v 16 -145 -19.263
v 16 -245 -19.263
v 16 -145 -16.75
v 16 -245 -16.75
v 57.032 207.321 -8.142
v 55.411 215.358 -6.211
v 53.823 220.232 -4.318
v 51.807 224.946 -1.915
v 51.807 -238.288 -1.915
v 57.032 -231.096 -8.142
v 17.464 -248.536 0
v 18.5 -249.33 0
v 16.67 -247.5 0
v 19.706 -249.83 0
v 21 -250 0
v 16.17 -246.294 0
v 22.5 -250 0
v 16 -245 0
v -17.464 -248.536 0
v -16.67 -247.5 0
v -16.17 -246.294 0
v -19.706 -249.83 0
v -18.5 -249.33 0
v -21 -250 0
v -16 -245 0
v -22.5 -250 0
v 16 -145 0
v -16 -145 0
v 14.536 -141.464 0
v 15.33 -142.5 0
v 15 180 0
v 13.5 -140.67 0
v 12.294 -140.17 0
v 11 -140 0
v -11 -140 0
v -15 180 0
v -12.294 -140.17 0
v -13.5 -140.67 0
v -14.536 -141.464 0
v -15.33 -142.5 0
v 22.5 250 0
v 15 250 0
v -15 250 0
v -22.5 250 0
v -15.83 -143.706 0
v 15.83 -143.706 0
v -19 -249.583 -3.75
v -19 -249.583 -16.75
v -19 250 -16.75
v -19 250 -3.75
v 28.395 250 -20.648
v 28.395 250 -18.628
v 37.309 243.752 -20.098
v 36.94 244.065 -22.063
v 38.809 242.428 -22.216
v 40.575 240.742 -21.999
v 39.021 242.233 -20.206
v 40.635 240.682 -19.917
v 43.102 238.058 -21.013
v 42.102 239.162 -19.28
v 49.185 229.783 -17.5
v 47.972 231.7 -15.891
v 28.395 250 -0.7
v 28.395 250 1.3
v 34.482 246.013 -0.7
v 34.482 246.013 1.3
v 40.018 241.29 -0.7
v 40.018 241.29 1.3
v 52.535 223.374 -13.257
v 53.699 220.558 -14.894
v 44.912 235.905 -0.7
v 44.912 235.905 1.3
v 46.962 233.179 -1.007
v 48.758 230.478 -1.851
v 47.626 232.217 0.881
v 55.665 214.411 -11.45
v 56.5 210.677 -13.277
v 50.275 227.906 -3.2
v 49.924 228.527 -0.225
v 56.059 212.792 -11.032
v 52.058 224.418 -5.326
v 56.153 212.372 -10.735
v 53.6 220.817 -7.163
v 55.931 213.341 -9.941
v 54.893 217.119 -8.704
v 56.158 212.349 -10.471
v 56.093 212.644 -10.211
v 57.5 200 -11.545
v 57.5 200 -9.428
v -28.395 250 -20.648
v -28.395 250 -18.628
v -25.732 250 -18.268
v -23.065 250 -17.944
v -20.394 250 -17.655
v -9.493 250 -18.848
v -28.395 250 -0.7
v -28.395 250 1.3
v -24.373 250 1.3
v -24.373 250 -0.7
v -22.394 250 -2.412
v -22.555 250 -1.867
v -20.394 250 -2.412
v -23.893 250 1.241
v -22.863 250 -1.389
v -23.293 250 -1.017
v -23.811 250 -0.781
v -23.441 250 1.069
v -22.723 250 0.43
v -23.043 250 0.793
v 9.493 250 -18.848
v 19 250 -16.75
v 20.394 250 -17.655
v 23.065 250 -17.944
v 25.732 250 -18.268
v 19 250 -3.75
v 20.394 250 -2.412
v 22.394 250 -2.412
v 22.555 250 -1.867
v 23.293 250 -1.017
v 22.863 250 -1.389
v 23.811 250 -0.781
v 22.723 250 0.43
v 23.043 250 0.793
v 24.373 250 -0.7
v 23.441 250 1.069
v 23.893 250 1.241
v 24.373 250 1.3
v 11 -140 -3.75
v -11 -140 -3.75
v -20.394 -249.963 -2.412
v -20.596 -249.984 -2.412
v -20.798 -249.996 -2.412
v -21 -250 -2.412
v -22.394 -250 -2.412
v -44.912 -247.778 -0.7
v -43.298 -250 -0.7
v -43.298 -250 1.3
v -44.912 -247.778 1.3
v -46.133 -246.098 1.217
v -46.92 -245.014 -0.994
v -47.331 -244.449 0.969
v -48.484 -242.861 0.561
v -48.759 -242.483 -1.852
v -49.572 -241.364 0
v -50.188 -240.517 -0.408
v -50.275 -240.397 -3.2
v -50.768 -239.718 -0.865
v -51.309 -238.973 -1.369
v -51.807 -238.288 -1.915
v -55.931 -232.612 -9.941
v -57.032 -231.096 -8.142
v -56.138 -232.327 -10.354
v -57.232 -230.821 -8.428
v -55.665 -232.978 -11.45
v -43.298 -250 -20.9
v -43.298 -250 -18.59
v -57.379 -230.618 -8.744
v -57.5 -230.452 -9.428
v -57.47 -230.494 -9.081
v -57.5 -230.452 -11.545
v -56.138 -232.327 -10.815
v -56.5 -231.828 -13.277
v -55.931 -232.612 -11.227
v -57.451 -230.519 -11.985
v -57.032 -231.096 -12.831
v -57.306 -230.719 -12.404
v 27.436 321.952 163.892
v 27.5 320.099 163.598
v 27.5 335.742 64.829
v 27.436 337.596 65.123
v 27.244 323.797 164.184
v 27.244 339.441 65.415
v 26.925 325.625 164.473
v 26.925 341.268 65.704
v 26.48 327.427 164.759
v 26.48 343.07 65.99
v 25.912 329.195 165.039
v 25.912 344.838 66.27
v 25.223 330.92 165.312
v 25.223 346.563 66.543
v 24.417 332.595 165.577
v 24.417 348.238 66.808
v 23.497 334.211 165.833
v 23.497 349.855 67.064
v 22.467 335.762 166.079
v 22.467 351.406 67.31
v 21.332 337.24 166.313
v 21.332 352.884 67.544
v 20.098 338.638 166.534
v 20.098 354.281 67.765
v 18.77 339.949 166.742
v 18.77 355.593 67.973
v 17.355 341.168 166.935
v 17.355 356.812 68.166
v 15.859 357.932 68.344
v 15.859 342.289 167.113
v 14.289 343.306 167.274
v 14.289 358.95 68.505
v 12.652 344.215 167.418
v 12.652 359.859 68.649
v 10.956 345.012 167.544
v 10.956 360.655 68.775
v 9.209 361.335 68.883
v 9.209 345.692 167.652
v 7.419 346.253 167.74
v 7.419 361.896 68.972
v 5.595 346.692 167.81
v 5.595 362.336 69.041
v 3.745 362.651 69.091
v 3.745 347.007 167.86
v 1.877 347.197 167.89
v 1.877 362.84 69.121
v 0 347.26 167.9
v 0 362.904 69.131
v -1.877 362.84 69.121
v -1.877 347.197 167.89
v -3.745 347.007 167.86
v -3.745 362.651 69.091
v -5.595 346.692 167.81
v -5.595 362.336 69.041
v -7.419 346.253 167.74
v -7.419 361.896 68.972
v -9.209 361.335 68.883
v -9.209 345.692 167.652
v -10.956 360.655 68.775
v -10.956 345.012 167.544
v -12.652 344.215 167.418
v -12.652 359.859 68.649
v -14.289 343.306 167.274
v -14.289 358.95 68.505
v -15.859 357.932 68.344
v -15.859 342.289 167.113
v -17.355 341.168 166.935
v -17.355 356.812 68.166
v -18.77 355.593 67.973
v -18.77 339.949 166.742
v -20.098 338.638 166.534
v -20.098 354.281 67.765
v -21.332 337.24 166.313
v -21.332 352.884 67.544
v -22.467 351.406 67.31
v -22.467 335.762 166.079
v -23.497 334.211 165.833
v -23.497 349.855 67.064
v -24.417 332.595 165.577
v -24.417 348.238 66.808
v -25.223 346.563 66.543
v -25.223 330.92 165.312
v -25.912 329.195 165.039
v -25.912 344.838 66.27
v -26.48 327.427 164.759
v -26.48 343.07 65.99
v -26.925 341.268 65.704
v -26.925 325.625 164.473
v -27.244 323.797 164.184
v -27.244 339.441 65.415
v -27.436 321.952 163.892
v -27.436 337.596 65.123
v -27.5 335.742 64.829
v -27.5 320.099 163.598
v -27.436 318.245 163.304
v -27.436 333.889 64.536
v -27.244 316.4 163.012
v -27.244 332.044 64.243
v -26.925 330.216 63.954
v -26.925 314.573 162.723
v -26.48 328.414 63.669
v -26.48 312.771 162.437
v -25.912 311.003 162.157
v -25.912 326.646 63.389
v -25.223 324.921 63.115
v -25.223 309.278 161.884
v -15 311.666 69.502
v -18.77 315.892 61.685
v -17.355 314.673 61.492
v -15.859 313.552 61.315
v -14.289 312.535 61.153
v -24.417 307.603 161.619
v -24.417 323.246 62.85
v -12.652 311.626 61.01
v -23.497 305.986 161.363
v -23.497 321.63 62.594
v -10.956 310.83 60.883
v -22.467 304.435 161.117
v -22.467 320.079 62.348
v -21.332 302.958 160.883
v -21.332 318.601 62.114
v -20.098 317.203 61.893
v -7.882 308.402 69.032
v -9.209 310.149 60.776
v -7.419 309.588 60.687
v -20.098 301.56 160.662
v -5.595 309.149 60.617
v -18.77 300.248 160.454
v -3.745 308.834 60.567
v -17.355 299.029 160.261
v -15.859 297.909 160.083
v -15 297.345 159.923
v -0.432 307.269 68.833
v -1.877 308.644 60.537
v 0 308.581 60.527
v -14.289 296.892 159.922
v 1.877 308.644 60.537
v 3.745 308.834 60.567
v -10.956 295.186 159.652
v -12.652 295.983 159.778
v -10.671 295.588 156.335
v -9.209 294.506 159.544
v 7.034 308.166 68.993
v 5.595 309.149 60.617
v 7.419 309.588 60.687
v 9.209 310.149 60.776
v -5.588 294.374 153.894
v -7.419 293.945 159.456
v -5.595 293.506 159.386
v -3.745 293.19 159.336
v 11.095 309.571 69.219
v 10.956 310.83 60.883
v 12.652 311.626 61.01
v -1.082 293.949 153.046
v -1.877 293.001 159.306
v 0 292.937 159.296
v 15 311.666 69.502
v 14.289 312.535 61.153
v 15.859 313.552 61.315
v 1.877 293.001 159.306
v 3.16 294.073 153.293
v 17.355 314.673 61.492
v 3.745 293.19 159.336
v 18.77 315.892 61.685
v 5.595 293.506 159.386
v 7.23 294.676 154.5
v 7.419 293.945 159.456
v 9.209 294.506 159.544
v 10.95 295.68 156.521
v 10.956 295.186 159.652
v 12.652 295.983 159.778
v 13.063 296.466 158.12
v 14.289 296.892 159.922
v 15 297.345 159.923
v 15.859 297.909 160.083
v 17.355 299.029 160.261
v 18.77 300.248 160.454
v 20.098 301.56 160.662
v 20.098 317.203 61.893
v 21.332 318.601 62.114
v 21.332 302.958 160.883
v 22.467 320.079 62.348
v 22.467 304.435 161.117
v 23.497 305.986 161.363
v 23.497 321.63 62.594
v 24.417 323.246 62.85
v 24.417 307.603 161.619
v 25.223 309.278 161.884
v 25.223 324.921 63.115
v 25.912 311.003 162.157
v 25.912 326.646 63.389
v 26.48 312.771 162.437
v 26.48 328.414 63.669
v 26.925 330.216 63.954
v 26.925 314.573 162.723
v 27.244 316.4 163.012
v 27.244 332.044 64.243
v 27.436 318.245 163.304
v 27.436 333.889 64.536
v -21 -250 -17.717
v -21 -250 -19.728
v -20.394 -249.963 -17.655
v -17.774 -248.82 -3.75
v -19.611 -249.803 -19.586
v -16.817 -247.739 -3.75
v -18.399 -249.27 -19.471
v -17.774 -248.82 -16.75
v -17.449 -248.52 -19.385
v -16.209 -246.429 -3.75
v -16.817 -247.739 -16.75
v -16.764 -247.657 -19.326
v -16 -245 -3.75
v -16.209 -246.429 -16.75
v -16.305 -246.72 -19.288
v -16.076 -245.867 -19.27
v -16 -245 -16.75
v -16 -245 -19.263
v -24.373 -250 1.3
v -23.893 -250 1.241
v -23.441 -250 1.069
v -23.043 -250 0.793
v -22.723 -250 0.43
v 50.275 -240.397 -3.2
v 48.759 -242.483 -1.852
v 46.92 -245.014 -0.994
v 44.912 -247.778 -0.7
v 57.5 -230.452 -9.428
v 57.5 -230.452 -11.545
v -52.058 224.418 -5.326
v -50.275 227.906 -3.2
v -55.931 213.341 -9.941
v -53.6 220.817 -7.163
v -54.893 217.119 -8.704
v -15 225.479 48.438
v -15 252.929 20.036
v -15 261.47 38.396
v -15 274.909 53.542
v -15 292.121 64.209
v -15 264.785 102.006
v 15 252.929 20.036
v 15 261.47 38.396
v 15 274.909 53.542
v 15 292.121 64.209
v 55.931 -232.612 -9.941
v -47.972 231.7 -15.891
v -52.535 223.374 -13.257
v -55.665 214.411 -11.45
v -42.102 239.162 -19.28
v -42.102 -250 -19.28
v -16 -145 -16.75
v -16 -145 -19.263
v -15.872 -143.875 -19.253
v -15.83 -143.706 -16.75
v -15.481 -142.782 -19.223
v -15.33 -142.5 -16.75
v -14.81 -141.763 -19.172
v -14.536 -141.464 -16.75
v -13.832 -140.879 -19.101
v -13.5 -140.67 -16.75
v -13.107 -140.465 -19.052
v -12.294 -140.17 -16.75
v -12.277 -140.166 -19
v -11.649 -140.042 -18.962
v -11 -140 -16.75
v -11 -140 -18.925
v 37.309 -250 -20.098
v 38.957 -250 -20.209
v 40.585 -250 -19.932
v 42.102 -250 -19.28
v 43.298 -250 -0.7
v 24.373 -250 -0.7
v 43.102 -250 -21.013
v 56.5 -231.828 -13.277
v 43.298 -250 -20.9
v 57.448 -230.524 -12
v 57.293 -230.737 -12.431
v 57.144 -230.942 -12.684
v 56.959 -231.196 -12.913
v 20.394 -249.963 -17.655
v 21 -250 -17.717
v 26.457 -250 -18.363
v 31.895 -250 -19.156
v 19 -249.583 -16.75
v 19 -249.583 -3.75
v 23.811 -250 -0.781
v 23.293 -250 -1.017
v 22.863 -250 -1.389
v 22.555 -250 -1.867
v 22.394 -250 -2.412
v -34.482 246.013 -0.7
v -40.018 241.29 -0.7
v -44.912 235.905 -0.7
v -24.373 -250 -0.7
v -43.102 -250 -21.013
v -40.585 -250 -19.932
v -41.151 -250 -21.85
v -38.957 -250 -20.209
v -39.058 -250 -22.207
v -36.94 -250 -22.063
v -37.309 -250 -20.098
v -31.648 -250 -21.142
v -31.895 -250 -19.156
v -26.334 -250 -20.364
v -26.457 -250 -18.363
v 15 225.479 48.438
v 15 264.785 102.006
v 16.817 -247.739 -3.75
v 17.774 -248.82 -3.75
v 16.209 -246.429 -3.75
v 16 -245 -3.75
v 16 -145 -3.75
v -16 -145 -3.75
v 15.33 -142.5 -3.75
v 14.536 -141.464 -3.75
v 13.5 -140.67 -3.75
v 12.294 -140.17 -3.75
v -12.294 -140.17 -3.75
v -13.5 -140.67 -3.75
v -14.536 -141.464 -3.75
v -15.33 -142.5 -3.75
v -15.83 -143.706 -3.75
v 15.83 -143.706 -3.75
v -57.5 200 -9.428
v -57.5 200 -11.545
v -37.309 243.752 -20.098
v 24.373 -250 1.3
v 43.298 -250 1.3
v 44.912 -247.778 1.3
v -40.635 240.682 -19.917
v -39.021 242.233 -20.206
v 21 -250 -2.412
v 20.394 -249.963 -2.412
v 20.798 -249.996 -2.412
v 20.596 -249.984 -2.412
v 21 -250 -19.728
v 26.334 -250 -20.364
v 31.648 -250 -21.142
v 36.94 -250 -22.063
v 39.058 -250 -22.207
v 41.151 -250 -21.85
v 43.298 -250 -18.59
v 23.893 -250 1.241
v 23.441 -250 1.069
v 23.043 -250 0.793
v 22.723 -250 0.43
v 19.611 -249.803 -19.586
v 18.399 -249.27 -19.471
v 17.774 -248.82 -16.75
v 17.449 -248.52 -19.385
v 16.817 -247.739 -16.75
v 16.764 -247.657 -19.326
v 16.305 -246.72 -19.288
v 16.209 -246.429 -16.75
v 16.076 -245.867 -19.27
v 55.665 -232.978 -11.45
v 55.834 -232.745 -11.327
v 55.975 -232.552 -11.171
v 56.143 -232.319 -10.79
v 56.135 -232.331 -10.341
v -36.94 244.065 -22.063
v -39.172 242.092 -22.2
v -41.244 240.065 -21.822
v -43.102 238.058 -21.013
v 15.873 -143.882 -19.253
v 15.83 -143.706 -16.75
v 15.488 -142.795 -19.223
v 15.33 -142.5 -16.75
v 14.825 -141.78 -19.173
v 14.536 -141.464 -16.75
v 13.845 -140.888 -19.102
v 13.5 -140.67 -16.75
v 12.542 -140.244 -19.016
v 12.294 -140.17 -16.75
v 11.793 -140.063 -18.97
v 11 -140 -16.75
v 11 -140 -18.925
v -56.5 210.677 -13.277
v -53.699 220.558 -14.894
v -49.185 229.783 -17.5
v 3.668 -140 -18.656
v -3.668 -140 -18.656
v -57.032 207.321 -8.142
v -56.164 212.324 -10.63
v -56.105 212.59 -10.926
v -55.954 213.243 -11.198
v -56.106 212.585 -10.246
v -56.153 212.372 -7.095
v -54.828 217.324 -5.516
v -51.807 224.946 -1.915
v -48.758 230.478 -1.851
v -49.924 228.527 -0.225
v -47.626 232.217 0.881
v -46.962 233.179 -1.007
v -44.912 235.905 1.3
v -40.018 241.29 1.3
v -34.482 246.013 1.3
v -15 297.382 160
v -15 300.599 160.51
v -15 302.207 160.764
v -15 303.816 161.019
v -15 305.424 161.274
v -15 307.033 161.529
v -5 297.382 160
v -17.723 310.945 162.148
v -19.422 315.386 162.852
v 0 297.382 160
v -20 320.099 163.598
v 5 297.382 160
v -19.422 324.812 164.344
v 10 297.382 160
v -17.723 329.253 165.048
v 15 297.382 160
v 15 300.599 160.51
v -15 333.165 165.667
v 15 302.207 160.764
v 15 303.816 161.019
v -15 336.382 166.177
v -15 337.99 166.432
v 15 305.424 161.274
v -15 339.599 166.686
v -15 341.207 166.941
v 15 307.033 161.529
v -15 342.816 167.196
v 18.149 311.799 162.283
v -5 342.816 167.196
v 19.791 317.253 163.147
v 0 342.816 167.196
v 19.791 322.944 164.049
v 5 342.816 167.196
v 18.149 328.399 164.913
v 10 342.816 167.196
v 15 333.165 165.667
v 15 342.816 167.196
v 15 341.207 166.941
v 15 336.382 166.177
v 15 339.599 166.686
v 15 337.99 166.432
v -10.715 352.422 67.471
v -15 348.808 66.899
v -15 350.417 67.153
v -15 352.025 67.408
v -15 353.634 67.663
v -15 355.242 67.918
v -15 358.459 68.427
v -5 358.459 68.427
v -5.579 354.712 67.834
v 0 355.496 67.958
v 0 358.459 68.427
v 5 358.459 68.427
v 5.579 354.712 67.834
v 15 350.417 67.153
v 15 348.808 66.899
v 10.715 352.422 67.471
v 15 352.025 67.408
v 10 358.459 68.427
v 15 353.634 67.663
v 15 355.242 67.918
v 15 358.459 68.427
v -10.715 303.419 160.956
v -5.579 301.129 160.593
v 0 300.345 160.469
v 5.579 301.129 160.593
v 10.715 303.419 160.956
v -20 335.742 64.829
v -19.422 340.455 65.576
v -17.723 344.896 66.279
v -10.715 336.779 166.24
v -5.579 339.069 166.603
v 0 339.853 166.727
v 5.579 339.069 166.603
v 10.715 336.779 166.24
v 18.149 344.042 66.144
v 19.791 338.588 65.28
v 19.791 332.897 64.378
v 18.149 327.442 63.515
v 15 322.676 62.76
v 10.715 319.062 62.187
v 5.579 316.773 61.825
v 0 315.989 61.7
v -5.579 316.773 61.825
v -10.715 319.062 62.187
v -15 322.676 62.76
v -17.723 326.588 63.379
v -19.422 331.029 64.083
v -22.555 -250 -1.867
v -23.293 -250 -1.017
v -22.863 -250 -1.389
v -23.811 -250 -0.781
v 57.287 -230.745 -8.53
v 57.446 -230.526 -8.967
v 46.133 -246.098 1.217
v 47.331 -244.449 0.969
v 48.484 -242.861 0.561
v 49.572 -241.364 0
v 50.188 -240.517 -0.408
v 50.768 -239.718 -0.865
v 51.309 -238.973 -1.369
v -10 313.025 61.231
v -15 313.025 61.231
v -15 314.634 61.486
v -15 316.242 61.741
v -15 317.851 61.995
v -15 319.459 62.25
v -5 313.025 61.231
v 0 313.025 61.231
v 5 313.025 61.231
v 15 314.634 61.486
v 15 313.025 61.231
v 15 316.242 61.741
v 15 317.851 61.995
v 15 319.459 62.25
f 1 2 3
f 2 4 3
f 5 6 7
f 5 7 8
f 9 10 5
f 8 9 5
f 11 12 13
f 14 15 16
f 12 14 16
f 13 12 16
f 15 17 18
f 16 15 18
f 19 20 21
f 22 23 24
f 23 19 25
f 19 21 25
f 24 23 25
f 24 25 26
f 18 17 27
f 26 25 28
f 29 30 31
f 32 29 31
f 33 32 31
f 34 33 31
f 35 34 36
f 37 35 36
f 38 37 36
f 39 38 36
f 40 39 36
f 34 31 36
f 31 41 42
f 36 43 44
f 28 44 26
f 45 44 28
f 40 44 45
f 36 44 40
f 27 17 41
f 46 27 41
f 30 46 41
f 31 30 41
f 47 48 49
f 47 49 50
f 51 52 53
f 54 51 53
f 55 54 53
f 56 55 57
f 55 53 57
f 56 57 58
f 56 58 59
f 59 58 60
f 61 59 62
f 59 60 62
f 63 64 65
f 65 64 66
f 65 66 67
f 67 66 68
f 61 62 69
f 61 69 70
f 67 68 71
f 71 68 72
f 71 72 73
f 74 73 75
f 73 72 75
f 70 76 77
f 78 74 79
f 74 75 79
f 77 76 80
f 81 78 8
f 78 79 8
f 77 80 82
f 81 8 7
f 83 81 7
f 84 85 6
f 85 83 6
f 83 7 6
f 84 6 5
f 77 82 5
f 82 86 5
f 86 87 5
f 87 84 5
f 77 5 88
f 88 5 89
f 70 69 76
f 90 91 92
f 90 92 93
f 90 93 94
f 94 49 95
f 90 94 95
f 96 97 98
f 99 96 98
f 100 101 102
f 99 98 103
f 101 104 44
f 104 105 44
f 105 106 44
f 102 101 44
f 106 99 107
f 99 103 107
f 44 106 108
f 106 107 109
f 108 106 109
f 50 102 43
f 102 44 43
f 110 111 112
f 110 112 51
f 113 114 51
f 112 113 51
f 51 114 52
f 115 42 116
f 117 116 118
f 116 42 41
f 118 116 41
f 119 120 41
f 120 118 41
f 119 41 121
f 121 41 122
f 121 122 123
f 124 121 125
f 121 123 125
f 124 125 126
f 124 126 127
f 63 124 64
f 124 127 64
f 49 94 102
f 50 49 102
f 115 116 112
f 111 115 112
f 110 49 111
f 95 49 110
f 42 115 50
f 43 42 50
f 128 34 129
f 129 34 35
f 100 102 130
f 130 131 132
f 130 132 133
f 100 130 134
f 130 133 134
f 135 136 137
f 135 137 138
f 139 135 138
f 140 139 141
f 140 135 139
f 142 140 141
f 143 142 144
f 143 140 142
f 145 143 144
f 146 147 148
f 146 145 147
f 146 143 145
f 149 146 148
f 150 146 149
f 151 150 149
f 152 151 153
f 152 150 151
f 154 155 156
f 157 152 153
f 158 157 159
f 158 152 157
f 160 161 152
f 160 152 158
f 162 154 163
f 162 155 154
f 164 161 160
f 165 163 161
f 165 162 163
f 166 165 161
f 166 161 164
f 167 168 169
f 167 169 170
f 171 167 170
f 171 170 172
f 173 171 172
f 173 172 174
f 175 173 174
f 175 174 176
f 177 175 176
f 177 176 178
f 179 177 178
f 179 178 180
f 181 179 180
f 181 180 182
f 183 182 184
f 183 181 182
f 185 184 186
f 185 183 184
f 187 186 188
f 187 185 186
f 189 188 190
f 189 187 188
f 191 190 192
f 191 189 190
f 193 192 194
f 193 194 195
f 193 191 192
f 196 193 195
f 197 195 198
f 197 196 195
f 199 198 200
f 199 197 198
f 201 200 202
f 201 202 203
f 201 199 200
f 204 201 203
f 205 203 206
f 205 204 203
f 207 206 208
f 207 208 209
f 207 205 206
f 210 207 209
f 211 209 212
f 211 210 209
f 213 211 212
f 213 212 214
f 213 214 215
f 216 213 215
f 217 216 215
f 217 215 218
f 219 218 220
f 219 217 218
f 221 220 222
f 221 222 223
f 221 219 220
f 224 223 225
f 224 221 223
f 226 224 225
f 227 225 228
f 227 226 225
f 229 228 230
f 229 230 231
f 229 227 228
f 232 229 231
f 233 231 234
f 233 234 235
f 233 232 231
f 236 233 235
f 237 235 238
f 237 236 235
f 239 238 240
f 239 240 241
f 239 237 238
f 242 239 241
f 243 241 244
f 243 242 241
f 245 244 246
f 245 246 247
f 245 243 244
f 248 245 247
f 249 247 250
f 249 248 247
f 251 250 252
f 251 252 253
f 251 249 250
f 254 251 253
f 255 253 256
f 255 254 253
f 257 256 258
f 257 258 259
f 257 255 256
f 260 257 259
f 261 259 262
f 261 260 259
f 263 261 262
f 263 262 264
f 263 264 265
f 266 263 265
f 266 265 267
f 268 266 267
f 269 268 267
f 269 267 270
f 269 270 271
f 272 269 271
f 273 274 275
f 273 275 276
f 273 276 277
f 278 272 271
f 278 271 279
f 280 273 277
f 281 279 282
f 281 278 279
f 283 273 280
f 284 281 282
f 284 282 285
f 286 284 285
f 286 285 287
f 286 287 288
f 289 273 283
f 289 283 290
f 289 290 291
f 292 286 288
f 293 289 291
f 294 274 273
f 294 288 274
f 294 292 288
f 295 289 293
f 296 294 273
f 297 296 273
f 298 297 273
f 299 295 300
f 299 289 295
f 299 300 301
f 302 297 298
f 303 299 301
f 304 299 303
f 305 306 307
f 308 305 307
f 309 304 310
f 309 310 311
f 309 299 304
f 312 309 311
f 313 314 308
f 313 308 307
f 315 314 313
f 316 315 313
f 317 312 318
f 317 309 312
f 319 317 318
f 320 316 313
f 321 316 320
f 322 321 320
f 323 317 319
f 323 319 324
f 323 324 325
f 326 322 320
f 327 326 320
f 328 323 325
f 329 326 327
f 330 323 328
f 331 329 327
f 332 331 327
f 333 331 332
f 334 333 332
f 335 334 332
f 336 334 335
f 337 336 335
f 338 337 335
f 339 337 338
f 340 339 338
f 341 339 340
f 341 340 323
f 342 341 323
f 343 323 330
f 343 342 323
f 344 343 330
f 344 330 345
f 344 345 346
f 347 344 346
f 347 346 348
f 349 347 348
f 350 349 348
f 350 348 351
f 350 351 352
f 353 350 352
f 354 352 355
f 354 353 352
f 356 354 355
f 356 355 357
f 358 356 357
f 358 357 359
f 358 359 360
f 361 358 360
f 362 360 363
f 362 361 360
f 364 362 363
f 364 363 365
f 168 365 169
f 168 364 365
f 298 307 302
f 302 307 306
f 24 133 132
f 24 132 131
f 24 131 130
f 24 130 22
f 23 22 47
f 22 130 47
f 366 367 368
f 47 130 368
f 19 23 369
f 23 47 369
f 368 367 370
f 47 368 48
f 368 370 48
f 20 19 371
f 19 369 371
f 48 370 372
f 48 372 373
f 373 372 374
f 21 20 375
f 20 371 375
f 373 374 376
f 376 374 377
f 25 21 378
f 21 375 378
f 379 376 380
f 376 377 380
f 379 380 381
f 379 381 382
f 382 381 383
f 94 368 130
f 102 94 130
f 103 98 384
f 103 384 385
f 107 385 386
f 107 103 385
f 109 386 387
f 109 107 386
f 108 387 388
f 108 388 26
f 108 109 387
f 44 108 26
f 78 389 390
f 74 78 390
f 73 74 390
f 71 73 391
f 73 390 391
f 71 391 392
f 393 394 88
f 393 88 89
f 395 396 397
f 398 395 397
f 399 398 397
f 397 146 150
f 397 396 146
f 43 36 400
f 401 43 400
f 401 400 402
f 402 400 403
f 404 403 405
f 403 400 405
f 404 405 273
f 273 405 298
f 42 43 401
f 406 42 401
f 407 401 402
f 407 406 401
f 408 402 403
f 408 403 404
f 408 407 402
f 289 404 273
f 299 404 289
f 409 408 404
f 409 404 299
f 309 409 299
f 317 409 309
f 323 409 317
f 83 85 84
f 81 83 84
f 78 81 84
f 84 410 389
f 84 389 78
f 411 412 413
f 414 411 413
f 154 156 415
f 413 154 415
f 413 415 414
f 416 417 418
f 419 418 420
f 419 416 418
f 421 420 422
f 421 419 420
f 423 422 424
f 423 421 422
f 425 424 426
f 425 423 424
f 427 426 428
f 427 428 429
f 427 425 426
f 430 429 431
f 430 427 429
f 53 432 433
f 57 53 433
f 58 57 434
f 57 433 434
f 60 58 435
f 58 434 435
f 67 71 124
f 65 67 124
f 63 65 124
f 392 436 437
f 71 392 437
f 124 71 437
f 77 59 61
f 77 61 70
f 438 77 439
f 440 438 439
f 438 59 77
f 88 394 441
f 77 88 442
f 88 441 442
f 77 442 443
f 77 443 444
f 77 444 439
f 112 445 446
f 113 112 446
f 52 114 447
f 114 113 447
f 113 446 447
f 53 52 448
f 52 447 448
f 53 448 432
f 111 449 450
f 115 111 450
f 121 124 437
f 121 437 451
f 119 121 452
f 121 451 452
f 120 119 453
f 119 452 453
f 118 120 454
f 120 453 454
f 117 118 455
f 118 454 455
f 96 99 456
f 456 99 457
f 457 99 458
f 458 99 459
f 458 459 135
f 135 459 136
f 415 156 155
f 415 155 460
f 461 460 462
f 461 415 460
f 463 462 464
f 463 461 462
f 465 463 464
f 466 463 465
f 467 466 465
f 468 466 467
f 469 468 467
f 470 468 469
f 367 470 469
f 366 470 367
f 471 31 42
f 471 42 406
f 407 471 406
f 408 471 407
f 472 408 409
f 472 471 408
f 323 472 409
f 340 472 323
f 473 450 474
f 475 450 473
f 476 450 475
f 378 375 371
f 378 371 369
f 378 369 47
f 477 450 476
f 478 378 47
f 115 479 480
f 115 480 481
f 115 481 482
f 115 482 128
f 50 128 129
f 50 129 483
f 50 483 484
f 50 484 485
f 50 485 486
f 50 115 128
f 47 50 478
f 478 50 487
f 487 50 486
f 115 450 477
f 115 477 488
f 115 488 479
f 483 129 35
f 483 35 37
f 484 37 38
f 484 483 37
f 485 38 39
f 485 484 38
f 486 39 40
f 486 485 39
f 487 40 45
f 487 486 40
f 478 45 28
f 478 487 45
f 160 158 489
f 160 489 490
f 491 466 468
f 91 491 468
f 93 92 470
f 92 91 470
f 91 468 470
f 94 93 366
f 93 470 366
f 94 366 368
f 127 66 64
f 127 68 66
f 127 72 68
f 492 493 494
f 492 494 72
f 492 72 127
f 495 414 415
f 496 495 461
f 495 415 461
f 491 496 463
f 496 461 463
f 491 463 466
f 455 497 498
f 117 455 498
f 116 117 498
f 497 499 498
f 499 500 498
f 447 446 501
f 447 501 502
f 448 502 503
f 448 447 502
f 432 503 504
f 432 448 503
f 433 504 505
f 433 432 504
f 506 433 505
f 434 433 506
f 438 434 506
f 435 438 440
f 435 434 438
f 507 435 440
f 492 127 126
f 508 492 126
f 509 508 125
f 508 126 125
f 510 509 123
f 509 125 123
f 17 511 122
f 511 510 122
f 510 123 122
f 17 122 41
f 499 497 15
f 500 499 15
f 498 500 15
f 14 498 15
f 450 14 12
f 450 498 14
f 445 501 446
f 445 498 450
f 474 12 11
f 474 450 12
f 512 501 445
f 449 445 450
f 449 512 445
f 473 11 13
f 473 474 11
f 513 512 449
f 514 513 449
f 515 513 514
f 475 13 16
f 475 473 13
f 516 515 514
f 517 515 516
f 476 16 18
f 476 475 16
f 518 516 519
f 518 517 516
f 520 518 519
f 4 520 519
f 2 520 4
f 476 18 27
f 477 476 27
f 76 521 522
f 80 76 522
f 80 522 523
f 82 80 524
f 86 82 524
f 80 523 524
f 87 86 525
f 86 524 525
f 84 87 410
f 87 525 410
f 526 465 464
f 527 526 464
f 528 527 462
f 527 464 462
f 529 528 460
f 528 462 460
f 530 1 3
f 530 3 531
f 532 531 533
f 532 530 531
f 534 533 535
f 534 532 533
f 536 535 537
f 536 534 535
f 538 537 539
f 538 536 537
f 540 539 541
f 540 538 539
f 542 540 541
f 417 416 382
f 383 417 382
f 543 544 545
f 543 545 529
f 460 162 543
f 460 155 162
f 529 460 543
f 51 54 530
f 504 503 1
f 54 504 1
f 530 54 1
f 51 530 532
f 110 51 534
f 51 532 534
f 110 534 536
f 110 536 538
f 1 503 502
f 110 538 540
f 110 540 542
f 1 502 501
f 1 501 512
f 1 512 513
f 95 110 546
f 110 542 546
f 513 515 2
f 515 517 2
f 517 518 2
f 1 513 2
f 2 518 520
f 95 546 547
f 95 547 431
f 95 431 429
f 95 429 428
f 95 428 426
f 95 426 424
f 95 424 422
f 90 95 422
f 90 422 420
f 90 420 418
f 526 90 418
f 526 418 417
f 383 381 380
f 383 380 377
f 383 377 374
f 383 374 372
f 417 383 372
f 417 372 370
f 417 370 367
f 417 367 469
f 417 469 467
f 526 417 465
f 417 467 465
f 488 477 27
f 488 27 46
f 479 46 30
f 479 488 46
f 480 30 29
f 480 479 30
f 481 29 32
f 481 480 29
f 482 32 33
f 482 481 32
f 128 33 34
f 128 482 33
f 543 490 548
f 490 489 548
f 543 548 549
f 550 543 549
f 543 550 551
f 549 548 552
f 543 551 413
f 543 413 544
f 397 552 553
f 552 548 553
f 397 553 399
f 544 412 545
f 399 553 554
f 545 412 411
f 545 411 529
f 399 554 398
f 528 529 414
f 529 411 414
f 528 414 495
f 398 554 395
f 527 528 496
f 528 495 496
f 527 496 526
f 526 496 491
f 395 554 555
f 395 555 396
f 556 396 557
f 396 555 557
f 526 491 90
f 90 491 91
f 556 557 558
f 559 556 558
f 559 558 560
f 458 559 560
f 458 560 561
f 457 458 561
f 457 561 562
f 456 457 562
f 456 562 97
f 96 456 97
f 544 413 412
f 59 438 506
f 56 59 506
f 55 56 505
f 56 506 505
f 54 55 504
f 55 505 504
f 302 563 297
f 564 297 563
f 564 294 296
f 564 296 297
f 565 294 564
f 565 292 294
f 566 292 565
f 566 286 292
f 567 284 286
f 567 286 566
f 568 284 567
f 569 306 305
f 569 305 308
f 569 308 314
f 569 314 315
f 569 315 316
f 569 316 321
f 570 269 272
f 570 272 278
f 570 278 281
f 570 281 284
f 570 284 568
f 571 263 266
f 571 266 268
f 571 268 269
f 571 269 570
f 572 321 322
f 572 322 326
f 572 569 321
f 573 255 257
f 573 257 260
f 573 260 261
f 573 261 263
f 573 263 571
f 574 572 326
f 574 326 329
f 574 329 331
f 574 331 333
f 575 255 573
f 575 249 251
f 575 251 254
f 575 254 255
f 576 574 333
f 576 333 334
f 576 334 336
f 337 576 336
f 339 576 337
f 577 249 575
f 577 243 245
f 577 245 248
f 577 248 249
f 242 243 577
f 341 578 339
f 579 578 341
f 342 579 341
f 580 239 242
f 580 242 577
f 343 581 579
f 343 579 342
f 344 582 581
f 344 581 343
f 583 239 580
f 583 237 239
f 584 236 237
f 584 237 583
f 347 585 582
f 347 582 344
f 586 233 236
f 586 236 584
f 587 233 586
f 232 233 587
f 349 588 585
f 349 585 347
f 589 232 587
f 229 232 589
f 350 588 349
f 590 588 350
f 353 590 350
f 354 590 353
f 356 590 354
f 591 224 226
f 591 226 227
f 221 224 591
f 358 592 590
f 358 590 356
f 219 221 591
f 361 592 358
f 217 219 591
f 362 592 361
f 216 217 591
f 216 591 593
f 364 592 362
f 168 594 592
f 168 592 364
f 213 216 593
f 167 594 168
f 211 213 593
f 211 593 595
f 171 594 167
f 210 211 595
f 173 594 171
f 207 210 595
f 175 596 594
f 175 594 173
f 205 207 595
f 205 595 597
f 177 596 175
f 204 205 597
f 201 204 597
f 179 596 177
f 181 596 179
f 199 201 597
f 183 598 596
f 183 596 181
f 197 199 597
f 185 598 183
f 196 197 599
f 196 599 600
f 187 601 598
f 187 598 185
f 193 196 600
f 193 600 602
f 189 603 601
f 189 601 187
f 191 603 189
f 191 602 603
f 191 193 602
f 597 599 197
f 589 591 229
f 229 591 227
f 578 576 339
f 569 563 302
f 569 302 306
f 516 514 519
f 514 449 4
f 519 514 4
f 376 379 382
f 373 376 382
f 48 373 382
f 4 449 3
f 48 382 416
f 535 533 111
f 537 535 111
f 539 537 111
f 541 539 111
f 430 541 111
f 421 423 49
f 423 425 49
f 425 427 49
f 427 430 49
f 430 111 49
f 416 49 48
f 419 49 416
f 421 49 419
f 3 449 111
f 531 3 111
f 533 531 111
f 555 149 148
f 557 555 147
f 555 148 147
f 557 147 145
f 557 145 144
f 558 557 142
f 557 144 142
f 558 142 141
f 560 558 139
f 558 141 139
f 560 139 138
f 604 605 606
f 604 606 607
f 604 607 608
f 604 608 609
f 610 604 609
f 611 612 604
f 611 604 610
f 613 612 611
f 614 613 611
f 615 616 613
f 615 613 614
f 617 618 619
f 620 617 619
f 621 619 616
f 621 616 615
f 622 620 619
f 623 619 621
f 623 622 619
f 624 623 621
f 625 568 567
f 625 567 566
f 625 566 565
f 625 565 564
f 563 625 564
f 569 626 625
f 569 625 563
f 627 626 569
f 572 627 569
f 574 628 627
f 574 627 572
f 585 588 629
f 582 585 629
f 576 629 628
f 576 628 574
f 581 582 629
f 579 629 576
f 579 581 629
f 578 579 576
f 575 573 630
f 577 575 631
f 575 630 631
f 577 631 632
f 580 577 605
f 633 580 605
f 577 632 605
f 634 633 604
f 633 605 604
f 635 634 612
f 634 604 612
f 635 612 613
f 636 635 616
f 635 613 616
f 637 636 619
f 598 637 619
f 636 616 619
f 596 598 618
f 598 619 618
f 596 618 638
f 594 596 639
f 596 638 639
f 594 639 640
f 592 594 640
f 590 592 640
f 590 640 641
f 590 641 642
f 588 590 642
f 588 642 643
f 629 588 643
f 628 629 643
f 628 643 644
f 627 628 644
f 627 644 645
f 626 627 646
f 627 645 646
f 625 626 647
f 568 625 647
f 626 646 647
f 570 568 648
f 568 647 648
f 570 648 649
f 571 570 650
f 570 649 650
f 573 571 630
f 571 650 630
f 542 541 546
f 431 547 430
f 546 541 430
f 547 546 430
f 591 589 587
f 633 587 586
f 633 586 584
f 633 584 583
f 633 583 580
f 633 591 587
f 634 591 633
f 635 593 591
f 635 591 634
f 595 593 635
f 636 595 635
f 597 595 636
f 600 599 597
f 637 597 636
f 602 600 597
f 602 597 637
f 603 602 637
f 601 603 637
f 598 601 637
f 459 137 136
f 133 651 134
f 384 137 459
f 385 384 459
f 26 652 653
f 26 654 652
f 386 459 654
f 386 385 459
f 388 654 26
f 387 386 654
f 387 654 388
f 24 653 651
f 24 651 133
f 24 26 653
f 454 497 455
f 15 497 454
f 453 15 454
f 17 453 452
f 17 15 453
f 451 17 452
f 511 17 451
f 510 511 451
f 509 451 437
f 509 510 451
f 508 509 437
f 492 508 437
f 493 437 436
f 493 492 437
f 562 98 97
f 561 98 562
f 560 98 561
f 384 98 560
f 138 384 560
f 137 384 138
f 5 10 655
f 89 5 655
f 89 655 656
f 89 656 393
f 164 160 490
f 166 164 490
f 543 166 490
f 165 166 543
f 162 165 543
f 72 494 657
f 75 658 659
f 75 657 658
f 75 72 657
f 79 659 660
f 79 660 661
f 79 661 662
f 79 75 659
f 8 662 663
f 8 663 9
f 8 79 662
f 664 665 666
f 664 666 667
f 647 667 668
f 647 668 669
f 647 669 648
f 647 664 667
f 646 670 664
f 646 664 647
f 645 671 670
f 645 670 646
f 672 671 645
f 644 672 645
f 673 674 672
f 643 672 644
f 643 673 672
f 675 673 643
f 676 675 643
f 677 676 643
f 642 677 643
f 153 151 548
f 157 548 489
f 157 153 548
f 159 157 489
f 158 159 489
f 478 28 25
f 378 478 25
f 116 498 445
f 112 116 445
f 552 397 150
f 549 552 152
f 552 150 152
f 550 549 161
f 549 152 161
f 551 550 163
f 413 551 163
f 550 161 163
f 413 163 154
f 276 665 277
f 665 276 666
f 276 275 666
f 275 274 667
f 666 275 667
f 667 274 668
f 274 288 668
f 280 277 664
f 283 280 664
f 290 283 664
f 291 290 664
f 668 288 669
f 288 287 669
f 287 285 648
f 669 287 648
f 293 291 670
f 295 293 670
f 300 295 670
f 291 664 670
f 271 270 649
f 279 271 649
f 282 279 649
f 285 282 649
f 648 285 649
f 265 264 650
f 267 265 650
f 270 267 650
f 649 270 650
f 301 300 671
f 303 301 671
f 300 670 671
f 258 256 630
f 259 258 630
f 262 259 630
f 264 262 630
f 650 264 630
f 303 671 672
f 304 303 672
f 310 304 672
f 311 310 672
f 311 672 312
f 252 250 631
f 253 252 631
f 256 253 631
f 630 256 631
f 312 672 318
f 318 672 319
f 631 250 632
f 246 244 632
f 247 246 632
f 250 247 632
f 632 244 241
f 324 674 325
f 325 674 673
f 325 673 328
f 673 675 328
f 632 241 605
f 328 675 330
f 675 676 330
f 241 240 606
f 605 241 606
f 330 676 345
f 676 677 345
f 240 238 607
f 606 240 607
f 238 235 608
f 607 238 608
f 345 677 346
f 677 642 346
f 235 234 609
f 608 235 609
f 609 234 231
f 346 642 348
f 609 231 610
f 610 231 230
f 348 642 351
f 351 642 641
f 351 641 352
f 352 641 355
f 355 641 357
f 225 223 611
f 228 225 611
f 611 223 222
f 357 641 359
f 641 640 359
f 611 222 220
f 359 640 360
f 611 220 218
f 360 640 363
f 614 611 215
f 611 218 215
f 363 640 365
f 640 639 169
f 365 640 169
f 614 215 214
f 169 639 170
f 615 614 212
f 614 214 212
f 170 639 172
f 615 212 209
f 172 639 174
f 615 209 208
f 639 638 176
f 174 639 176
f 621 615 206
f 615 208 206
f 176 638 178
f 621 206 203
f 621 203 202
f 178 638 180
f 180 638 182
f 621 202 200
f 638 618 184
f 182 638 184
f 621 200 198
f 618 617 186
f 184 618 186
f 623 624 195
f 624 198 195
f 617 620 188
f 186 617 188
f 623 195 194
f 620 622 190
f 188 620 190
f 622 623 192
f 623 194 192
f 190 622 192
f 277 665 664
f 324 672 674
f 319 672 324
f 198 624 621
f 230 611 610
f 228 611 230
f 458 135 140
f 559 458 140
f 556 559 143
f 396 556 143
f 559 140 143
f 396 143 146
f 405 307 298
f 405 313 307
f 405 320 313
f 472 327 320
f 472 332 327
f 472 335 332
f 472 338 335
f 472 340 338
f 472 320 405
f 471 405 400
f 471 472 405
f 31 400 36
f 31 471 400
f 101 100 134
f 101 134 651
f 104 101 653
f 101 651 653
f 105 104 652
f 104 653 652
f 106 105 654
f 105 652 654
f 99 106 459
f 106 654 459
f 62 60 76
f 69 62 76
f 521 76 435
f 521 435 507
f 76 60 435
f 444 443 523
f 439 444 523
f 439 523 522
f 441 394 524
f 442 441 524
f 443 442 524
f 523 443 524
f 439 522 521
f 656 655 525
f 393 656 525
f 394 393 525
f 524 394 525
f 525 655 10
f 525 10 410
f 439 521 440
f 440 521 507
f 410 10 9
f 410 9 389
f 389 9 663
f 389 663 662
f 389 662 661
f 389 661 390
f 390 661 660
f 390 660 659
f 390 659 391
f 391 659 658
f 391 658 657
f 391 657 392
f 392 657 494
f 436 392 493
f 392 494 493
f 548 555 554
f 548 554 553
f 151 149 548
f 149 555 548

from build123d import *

# Parameters (mm, degrees)
F1_DEPTH       = 250
F2_W           = 38
F2_H           = 13
F3_DEPTH       = 250
F4_T1_DEPTH    = 509.3674969976
F5_R           = 9
F6_R           = 2
F8_DEPTH       = 764
F8_DEPTH_BACK  = 500.001
F10_DEPTH      = 22.2193051812
F10_DEPTH_BACK = 1.301
F12_DEPTH      = 1.3010001
F12_DEPTH_BACK = 22.219305294
F13_T1_DEPTH   = 3.7499991487
F13_T6_DEPTH   = 15.0134832828
F13_S7_R       = 200
F13_T8_DEPTH   = 10
F13_T12_DEPTH  = 15.0134832828
F13_S13_R      = 200
F13_T14_DEPTH  = 10
F13_T15_DEPTH  = 28.7499991487
F13_T17_DEPTH  = 27.5134832828
F15_DEPTH      = 15
F16_R          = 27.5
F17_DEPTH      = 100
F19_D          = 40


# Not quite as in the source:
# - a fillet or chamfer that OpenCascade refuses, or shapes differently, is made with other operations: its cross-section is extruded or revolved along the edge and cut away or added
# - an extrude ends at something that could not be found from the text; its depth is read off the source's solid


with BuildPart() as f1:
    # F0 (on Front) → F1 (new body, symmetric)
    with BuildSketch(Plane.XZ):
        with BuildLine():
            Line((22.5, 0), (0, 0))
            Line((0, 0), (-22.5, 0))
            Line((-22.5, 0), (-22.5, 1.3))
            Line((-22.5, 1.3), (-49.1090036882, 1.3))
            Line((-49.1090036882, 1.3), (-57.5, -8.7))
            Line((-57.5, -8.7), (-57.5, -12.7))
            Line((-57.5, -12.7), (-40.1794919243, -22.7))
            ThreePointArc((-40.1794919243, -22.7), (0, -18.6224551416), (40.1794919243, -22.7))
            Line((40.1794919243, -22.7), (57.5, -12.7))
            Line((57.5, -12.7), (57.5, -8.7))
            Line((57.5, -8.7), (49.1090036882, 1.3))
            Line((49.1090036882, 1.3), (22.5, 1.3))
            Line((22.5, 1.3), (22.5, 0))
        make_face()
    extrude(amount=F1_DEPTH, both=True)

    # F2 (on Front) → F3 (cut, symmetric)
    with BuildSketch(Plane.XZ):
        with Locations((0, -10.2499991487)):
            Rectangle(F2_W, F2_H)
    extrude(amount=F3_DEPTH, both=True, mode=Mode.SUBTRACT)

    # F4: fillet of radius 2 on 2 edges, made by hand

    # F4_s2 → F4_t1 (cut)
    with BuildSketch(Plane.XZ.offset(-254.6837484988)):
        with BuildLine():
            ThreePointArc((24.3734993995, 1.3), (23.2333239744, 0.9431676725), (22.5, 0))
            Line((22.5, 0), (22.5, 1.3))
            Line((22.5, 1.3), (24.3734993995, 1.3))
        make_face()
        with BuildLine():
            ThreePointArc((-24.3734993995, 1.3), (-23.2333239744, 0.9431676725), (-22.5, 0))
            Line((-22.5, 0), (-22.5, 1.3))
            Line((-22.5, 1.3), (-24.3734993995, 1.3))
        make_face()
    extrude(amount=F4_T1_DEPTH, mode=Mode.SUBTRACT)

    # F5
    f5_edges = [f1.edges().sort_by_distance(p)[0] for p in [
        (-49.109004, 0, 1.3),
        (49.109004, 0, 1.3),
        (40.179492, 0, -22.7),
        (-40.179492, 0, -22.7),
    ]]
    fillet(f5_edges, radius=F5_R)

    # F6
    f6_edges = [f1.edges().sort_by_distance(p)[0] for p in [
        (-57.5, 0, -8.7),
        (-57.5, 0, -12.7),
        (57.5, 0, -8.7),
        (57.5, 0, -12.7),
    ]]
    fillet(f6_edges, radius=F6_R)

    # F7 (on face) → F8 (cut, two sides)
    with BuildSketch(Plane.XZ.offset(250)) as f8_sk:
        with BuildLine():
            ThreePointArc((-37.3093701274, -20.0978700124), (-28.8776819579, -18.697270423), (-20.3942914958, -17.6546147432))
            Line((-20.3942914958, -17.6546147432), (-20.3942914958, -2.4123612095))
            Line((-20.3942914958, -2.4123612095), (-22.3942914958, -2.4123612095))
            ThreePointArc((-22.3942914958, -2.4123612095), (-23.0649271969, -1.1875057717), (-24.3734993995, -0.7))
            Line((-24.3734993995, -0.7), (-44.9122347648, -0.7))
            ThreePointArc((-44.9122347648, -0.7), (-47.870562597, -1.3558454907), (-50.2745458667, -3.2004867322))
            Line((-50.2745458667, -3.2004867322), (-55.9308095341, -9.9413592785))
            ThreePointArc((-55.9308095341, -9.9413592785), (-56.149572844, -10.7577950659), (-55.664765091, -11.450172292))
            Line((-55.664765091, -11.450172292), (-42.1022690923, -19.2804830077))
            ThreePointArc((-42.1022690923, -19.2804830077), (-39.7790673433, -20.1186780608), (-37.3093701274, -20.0978700124))
        make_face()
        with BuildLine():
            Line((22.3942914958, -2.4123612095), (20.3942914958, -2.4123612095))
            Line((20.3942914958, -2.4123612095), (20.3942914958, -17.6546147432))
            ThreePointArc((20.3942914958, -17.6546147432), (28.8776819579, -18.697270423), (37.3093701274, -20.0978700124))
            ThreePointArc((37.3093701274, -20.0978700124), (39.7790673433, -20.1186780608), (42.1022690923, -19.2804830077))
            Line((42.1022690923, -19.2804830077), (55.664765091, -11.450172292))
            ThreePointArc((55.664765091, -11.450172292), (56.149572844, -10.7577950659), (55.9308095341, -9.9413592785))
            Line((55.9308095341, -9.9413592785), (50.2745458667, -3.2004867322))
            ThreePointArc((50.2745458667, -3.2004867322), (47.870562597, -1.3558454907), (44.9122347648, -0.7))
            Line((44.9122347648, -0.7), (24.3734993995, -0.7))
            ThreePointArc((24.3734993995, -0.7), (23.0649271969, -1.1875057717), (22.3942914958, -2.4123612095))
        make_face()
    extrude(amount=F8_DEPTH, mode=Mode.SUBTRACT)
    extrude(f8_sk.sketch, amount=-F8_DEPTH_BACK, mode=Mode.SUBTRACT)

    # F9 (on Top) → F10 (cut, two sides)
    with BuildSketch(Plane.XY) as f10_sk:
        with BuildLine():
            ThreePointArc((-57.5, 200), (0, 257.5), (57.5, 200))
            Line((57.5, 200), (57.5, 280))
            Line((57.5, 280), (-57.5, 280))
            Line((-57.5, 280), (-57.5, 200))
        make_face()
    extrude(amount=-F10_DEPTH, mode=Mode.SUBTRACT)
    extrude(f10_sk.sketch, amount=F10_DEPTH_BACK, mode=Mode.SUBTRACT)

    # F11 (on Top) → F12 (cut, two sides)
    with BuildSketch(Plane.XY) as f12_sk:
        Polygon((-43.2975540478, -250), (-68, -216), (-68, -346), (68, -346), (68, -216), (43.2975540478, -250), (16, -250), (16, -140), (-16, -140), (-16, -250), align=None)
    extrude(amount=F12_DEPTH, mode=Mode.SUBTRACT)
    extrude(f12_sk.sketch, amount=-F12_DEPTH_BACK, mode=Mode.SUBTRACT)

    # F13: fillet of radius 5 on 8 edges, made by hand

    # F13_s2 → F13_t1 (join)
    with BuildSketch(Plane.XY.offset(-3.7499991487)):
        with BuildLine():
            ThreePointArc((-11, -140), (-14.5355339059, -141.4644660941), (-16, -145))
            Line((-16, -145), (-16, -140))
            Line((-16, -140), (-11, -140))
        make_face()
        with BuildLine():
            ThreePointArc((16, -145), (14.5355339059, -141.4644660941), (11, -140))
            Line((11, -140), (16, -140))
            Line((16, -140), (16, -145))
        make_face()
    extrude(amount=F13_T1_DEPTH)


with BuildPart() as f13_tool4:
    # F13_s5 → F13_t6 (new body)
    with BuildSketch(Plane.XY.offset(-16.7499991487)):
        with BuildLine():
            ThreePointArc((-16, -145), (-14.5355339059, -141.4644660941), (-11, -140))
            Line((-11, -140), (-16, -140))
            Line((-16, -140), (-16, -145))
        make_face()
    extrude(amount=-F13_T6_DEPTH)

    # F13_s7 → F13_t8 (cut, symmetric)
    with BuildSketch(Plane.XZ.offset(142.5)):
        with Locations((0, -218.6224551416)):
            Circle(F13_S7_R)
    extrude(amount=F13_T8_DEPTH, both=True, mode=Mode.SUBTRACT)


with BuildPart() as f1_1:
    add(f1.part)

    # F13_t3: union F13_tool4
    add(f13_tool4.part)


with BuildPart() as f13_tool10:
    # F13_s11 → F13_t12 (new body)
    with BuildSketch(Plane.XY.offset(-31.7634824315)):
        with BuildLine():
            ThreePointArc((16, -145), (14.5355339059, -141.4644660941), (11, -140))
            Line((11, -140), (16, -140))
            Line((16, -140), (16, -145))
        make_face()
    extrude(amount=F13_T12_DEPTH)

    # F13_s13 → F13_t14 (cut, symmetric)
    with BuildSketch(Plane.XZ.offset(142.5)):
        with Locations((0, -218.6224551416)):
            Circle(F13_S13_R)
    extrude(amount=F13_T14_DEPTH, both=True, mode=Mode.SUBTRACT)


with BuildPart() as f1_2:
    add(f1_1.part)

    # F13_t9: union F13_tool10
    add(f13_tool10.part)

    # F13_s16 → F13_t15 (cut)
    with BuildSketch(Plane.XY.offset(-16.2499991487)):
        with BuildLine():
            ThreePointArc((21, -250), (17.4644660941, -248.5355339059), (16, -245))
            Line((16, -245), (16, -250))
            Line((16, -250), (21, -250))
        make_face()
        with BuildLine():
            ThreePointArc((-21, -250), (-17.4644660941, -248.5355339059), (-16, -245))
            Line((-16, -245), (-16, -250))
            Line((-16, -250), (-21, -250))
        make_face()
    extrude(amount=F13_T15_DEPTH, mode=Mode.SUBTRACT)

    # F13_s18 → F13_t17 (cut)
    with BuildSketch(Plane.XY.offset(-31.7634824315)):
        with BuildLine():
            ThreePointArc((21, -250), (17.4644660941, -248.5355339059), (16, -245))
            Line((16, -245), (16, -250))
            Line((16, -250), (21, -250))
        make_face()
        with BuildLine():
            ThreePointArc((-21, -250), (-17.4644660941, -248.5355339059), (-16, -245))
            Line((-16, -245), (-16, -250))
            Line((-16, -250), (-21, -250))
        make_face()
    extrude(amount=F13_T17_DEPTH, mode=Mode.SUBTRACT)

    # F14 (on Right) → F15 (join, symmetric)
    with BuildSketch(Plane.YZ):
        with BuildLine():
            ThreePointArc((297.3819995028, 160), (245.9666940414, 74.662277853), (180, 0))
            Line((180, 0), (250, 0))
            ThreePointArc((250, 0), (267.6550746197, 46.4758946867), (311.7145367693, 69.5079211245))
            Line((311.7145367693, 69.5079211245), (313.0254460068, 61.2311659405))
            Line((313.0254460068, 61.2311659405), (358.4591096742, 68.4271513323))
            Line((358.4591096742, 68.4271513323), (342.8156631702, 167.1959853919))
            Line((342.8156631702, 167.1959853919), (297.3819995028, 160))
        make_face()
    extrude(amount=F15_DEPTH, both=True)

    # F16 (on face) → F17 (join, through all)
    with BuildSketch(Plane(origin=(0, -17.4439040266, 110.1364754698), x_dir=(1, 0, 0), z_dir=(0, -0.156434465, 0.9876883406))):
        with Locations((0, 341.7502480182)):
            Circle(F16_R)
    extrude(amount=-F17_DEPTH)

    # F19 (through all)
    with Locations(Plane(origin=(0, -17.4439040266, 110.1364754698), x_dir=(1, 0, 0), z_dir=(0, -0.156434465, 0.9876883406))):
        with Locations((0, 341.7502480182)):
            Hole(F19_D / 2)


solid = f1_2.part
